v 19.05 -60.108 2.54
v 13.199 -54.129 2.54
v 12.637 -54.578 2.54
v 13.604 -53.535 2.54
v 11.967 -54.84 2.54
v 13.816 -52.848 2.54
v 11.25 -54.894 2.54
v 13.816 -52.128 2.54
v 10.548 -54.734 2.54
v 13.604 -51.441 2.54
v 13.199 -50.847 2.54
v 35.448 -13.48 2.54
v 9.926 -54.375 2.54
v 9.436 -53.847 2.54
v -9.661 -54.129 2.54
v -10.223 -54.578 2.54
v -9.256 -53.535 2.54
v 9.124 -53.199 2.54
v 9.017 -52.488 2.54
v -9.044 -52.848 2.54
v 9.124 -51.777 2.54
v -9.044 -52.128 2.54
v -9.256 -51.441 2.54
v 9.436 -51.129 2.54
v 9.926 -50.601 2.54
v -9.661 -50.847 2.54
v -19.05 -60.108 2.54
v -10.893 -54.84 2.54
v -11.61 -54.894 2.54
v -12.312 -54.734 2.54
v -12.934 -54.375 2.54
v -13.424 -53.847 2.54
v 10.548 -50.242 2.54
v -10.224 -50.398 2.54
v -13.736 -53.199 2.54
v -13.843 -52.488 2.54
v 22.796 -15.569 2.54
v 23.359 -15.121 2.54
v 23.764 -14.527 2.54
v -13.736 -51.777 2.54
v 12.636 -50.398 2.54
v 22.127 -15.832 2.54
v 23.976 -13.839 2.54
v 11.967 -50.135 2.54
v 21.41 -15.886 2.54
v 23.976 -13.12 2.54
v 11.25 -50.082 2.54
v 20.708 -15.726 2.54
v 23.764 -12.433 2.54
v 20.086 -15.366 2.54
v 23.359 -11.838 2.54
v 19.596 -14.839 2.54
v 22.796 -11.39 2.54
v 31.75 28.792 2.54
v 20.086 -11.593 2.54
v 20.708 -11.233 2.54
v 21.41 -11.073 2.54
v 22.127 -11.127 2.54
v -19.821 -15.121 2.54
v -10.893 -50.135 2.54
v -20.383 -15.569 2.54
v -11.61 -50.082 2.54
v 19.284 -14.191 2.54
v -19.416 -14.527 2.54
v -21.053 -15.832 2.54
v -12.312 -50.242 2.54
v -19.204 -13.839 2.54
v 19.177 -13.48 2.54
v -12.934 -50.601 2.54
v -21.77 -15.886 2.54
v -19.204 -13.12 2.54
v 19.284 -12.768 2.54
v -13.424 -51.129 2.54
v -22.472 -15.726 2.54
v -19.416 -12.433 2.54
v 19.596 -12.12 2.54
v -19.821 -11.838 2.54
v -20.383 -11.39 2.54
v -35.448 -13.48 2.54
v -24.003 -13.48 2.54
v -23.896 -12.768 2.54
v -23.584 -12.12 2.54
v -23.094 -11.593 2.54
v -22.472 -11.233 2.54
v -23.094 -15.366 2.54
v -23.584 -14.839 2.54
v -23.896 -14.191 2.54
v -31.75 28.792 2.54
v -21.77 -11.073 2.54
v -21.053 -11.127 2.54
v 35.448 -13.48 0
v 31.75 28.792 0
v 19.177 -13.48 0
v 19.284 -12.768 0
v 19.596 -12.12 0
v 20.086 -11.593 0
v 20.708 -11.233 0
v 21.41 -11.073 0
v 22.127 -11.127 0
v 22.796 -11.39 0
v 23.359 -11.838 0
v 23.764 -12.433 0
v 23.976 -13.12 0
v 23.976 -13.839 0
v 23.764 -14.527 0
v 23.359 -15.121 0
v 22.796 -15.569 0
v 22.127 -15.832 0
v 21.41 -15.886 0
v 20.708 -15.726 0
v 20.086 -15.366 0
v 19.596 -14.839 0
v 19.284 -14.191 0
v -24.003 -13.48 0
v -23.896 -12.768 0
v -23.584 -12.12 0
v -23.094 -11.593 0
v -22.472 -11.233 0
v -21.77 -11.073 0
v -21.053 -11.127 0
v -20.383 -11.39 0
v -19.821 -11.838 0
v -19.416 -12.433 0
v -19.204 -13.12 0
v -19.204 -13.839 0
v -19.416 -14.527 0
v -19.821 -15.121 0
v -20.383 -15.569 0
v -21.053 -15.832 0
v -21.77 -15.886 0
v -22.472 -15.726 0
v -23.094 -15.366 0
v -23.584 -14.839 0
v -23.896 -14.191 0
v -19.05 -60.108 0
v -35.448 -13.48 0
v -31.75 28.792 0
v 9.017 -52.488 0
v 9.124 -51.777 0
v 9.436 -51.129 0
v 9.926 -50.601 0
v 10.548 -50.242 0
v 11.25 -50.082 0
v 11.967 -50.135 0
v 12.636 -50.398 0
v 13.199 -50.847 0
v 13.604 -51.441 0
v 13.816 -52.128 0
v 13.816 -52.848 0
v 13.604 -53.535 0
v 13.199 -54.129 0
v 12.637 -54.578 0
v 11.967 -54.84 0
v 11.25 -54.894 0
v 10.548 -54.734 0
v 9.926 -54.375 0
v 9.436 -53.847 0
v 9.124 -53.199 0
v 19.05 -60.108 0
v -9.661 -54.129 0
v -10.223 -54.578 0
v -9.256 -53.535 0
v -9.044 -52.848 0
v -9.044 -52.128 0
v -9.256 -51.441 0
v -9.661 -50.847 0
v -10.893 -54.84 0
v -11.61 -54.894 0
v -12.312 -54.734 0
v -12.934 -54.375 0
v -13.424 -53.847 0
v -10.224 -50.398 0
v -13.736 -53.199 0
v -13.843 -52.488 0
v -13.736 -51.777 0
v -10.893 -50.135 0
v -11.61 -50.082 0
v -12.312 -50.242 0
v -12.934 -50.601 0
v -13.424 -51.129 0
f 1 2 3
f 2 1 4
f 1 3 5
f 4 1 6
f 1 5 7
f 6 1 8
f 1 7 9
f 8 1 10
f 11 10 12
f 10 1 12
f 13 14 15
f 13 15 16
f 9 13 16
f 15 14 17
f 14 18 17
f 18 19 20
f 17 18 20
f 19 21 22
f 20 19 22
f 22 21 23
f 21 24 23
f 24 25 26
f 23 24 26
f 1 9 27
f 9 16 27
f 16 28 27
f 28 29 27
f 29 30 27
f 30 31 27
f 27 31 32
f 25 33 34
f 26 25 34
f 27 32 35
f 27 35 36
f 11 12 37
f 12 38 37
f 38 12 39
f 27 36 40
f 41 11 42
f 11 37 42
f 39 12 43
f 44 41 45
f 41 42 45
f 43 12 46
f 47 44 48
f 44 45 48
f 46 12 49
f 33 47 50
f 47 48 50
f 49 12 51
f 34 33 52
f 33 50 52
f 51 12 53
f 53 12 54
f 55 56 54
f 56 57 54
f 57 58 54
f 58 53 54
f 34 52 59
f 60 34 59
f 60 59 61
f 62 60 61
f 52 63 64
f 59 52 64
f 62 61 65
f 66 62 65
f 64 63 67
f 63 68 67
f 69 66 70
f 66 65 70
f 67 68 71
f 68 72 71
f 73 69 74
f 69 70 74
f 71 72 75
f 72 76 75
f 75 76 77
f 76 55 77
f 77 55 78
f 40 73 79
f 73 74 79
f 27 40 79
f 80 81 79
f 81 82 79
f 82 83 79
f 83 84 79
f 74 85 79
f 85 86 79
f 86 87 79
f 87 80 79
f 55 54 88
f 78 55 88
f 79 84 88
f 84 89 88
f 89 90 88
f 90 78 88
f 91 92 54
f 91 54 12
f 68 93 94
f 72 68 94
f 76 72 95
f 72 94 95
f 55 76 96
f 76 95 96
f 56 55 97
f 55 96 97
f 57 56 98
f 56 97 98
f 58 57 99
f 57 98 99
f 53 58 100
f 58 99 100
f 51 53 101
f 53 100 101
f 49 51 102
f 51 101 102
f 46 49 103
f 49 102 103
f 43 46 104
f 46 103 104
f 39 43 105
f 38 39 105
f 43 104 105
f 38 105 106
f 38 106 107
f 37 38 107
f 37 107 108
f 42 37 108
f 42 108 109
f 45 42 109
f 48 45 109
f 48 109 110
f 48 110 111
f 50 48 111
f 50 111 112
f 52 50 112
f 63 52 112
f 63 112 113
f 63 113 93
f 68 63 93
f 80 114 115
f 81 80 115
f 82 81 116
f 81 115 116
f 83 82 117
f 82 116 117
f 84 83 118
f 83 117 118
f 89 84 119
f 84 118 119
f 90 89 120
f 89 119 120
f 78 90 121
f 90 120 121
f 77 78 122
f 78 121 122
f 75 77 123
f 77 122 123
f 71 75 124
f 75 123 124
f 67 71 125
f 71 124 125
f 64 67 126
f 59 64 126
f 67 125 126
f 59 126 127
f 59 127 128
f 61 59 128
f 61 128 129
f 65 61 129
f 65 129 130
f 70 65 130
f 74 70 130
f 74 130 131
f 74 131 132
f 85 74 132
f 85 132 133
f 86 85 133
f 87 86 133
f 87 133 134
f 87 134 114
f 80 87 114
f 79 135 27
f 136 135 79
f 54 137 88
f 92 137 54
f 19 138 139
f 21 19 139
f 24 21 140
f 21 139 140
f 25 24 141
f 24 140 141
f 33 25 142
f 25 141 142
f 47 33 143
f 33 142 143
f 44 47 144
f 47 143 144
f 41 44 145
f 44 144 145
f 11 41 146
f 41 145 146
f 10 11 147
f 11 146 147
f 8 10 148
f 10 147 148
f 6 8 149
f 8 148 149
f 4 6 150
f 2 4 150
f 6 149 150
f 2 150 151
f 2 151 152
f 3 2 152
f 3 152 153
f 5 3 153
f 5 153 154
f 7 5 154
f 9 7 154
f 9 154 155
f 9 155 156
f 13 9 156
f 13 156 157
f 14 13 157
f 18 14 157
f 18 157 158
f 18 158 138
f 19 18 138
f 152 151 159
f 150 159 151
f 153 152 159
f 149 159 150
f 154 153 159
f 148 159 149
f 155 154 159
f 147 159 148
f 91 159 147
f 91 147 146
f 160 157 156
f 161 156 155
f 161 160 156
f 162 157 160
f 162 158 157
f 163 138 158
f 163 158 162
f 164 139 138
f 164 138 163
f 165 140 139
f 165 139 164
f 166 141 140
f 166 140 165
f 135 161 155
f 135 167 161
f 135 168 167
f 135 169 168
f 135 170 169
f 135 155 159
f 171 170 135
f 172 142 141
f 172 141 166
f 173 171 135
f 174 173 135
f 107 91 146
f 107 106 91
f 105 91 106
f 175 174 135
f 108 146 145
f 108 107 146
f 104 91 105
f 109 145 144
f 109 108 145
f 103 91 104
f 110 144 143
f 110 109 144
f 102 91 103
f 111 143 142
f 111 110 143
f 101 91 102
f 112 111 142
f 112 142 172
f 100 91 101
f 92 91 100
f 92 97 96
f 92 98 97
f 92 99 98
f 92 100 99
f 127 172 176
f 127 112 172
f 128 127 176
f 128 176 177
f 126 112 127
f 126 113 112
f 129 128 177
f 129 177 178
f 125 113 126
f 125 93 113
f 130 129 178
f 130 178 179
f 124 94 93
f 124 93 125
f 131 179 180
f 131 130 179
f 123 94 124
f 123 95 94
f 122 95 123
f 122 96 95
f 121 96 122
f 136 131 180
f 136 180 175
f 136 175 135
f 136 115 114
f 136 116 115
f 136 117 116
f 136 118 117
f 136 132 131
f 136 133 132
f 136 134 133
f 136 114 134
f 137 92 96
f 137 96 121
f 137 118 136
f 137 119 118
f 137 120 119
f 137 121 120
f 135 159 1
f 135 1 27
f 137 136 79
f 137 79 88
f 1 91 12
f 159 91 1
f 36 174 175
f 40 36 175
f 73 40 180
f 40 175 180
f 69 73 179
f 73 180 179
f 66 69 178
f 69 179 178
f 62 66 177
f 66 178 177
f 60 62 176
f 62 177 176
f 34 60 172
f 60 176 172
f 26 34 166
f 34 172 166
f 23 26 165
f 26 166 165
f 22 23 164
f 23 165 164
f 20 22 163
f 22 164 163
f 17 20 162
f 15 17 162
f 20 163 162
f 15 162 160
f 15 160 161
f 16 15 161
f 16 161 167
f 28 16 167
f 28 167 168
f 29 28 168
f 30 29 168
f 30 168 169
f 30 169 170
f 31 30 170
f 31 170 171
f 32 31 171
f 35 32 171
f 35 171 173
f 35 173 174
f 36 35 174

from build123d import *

# Parameters (mm, degrees)
BOSS_EXTRUDE1_DEPTH = 2.54
SKETCH3_R           = 2.413
CUT_EXTRUDE1_DEPTH  = 70.828376229


with BuildPart() as part:
    # Sketch1 → Boss-Extrude1 (new body)
    with BuildSketch(Plane.XY):
        Polygon((-31.75, 28.792017296), (31.75, 28.792017296), (35.44828546, -13.479578937), (19.05, -60.107982704), (-19.05, -60.107982704), (-35.44828546, -13.479578937), align=None)
    extrude(amount=BOSS_EXTRUDE1_DEPTH)

    # Sketch3 → Cut-Extrude1 (cut, through all)
    with BuildSketch(Plane(origin=(0, 0, 0), x_dir=(-1, 0, 0), z_dir=(0, 0, -1))):
        with Locations((11.43, -52.487982704)):
            Circle(SKETCH3_R)
        with Locations((-11.43, -52.487982704)):
            Circle(SKETCH3_R)
        with Locations((21.59, -13.479578937)):
            Circle(SKETCH3_R)
        with Locations((-21.59, -13.479578937)):
            Circle(SKETCH3_R)
    extrude(amount=-CUT_EXTRUDE1_DEPTH, mode=Mode.SUBTRACT)


solid = part.part
